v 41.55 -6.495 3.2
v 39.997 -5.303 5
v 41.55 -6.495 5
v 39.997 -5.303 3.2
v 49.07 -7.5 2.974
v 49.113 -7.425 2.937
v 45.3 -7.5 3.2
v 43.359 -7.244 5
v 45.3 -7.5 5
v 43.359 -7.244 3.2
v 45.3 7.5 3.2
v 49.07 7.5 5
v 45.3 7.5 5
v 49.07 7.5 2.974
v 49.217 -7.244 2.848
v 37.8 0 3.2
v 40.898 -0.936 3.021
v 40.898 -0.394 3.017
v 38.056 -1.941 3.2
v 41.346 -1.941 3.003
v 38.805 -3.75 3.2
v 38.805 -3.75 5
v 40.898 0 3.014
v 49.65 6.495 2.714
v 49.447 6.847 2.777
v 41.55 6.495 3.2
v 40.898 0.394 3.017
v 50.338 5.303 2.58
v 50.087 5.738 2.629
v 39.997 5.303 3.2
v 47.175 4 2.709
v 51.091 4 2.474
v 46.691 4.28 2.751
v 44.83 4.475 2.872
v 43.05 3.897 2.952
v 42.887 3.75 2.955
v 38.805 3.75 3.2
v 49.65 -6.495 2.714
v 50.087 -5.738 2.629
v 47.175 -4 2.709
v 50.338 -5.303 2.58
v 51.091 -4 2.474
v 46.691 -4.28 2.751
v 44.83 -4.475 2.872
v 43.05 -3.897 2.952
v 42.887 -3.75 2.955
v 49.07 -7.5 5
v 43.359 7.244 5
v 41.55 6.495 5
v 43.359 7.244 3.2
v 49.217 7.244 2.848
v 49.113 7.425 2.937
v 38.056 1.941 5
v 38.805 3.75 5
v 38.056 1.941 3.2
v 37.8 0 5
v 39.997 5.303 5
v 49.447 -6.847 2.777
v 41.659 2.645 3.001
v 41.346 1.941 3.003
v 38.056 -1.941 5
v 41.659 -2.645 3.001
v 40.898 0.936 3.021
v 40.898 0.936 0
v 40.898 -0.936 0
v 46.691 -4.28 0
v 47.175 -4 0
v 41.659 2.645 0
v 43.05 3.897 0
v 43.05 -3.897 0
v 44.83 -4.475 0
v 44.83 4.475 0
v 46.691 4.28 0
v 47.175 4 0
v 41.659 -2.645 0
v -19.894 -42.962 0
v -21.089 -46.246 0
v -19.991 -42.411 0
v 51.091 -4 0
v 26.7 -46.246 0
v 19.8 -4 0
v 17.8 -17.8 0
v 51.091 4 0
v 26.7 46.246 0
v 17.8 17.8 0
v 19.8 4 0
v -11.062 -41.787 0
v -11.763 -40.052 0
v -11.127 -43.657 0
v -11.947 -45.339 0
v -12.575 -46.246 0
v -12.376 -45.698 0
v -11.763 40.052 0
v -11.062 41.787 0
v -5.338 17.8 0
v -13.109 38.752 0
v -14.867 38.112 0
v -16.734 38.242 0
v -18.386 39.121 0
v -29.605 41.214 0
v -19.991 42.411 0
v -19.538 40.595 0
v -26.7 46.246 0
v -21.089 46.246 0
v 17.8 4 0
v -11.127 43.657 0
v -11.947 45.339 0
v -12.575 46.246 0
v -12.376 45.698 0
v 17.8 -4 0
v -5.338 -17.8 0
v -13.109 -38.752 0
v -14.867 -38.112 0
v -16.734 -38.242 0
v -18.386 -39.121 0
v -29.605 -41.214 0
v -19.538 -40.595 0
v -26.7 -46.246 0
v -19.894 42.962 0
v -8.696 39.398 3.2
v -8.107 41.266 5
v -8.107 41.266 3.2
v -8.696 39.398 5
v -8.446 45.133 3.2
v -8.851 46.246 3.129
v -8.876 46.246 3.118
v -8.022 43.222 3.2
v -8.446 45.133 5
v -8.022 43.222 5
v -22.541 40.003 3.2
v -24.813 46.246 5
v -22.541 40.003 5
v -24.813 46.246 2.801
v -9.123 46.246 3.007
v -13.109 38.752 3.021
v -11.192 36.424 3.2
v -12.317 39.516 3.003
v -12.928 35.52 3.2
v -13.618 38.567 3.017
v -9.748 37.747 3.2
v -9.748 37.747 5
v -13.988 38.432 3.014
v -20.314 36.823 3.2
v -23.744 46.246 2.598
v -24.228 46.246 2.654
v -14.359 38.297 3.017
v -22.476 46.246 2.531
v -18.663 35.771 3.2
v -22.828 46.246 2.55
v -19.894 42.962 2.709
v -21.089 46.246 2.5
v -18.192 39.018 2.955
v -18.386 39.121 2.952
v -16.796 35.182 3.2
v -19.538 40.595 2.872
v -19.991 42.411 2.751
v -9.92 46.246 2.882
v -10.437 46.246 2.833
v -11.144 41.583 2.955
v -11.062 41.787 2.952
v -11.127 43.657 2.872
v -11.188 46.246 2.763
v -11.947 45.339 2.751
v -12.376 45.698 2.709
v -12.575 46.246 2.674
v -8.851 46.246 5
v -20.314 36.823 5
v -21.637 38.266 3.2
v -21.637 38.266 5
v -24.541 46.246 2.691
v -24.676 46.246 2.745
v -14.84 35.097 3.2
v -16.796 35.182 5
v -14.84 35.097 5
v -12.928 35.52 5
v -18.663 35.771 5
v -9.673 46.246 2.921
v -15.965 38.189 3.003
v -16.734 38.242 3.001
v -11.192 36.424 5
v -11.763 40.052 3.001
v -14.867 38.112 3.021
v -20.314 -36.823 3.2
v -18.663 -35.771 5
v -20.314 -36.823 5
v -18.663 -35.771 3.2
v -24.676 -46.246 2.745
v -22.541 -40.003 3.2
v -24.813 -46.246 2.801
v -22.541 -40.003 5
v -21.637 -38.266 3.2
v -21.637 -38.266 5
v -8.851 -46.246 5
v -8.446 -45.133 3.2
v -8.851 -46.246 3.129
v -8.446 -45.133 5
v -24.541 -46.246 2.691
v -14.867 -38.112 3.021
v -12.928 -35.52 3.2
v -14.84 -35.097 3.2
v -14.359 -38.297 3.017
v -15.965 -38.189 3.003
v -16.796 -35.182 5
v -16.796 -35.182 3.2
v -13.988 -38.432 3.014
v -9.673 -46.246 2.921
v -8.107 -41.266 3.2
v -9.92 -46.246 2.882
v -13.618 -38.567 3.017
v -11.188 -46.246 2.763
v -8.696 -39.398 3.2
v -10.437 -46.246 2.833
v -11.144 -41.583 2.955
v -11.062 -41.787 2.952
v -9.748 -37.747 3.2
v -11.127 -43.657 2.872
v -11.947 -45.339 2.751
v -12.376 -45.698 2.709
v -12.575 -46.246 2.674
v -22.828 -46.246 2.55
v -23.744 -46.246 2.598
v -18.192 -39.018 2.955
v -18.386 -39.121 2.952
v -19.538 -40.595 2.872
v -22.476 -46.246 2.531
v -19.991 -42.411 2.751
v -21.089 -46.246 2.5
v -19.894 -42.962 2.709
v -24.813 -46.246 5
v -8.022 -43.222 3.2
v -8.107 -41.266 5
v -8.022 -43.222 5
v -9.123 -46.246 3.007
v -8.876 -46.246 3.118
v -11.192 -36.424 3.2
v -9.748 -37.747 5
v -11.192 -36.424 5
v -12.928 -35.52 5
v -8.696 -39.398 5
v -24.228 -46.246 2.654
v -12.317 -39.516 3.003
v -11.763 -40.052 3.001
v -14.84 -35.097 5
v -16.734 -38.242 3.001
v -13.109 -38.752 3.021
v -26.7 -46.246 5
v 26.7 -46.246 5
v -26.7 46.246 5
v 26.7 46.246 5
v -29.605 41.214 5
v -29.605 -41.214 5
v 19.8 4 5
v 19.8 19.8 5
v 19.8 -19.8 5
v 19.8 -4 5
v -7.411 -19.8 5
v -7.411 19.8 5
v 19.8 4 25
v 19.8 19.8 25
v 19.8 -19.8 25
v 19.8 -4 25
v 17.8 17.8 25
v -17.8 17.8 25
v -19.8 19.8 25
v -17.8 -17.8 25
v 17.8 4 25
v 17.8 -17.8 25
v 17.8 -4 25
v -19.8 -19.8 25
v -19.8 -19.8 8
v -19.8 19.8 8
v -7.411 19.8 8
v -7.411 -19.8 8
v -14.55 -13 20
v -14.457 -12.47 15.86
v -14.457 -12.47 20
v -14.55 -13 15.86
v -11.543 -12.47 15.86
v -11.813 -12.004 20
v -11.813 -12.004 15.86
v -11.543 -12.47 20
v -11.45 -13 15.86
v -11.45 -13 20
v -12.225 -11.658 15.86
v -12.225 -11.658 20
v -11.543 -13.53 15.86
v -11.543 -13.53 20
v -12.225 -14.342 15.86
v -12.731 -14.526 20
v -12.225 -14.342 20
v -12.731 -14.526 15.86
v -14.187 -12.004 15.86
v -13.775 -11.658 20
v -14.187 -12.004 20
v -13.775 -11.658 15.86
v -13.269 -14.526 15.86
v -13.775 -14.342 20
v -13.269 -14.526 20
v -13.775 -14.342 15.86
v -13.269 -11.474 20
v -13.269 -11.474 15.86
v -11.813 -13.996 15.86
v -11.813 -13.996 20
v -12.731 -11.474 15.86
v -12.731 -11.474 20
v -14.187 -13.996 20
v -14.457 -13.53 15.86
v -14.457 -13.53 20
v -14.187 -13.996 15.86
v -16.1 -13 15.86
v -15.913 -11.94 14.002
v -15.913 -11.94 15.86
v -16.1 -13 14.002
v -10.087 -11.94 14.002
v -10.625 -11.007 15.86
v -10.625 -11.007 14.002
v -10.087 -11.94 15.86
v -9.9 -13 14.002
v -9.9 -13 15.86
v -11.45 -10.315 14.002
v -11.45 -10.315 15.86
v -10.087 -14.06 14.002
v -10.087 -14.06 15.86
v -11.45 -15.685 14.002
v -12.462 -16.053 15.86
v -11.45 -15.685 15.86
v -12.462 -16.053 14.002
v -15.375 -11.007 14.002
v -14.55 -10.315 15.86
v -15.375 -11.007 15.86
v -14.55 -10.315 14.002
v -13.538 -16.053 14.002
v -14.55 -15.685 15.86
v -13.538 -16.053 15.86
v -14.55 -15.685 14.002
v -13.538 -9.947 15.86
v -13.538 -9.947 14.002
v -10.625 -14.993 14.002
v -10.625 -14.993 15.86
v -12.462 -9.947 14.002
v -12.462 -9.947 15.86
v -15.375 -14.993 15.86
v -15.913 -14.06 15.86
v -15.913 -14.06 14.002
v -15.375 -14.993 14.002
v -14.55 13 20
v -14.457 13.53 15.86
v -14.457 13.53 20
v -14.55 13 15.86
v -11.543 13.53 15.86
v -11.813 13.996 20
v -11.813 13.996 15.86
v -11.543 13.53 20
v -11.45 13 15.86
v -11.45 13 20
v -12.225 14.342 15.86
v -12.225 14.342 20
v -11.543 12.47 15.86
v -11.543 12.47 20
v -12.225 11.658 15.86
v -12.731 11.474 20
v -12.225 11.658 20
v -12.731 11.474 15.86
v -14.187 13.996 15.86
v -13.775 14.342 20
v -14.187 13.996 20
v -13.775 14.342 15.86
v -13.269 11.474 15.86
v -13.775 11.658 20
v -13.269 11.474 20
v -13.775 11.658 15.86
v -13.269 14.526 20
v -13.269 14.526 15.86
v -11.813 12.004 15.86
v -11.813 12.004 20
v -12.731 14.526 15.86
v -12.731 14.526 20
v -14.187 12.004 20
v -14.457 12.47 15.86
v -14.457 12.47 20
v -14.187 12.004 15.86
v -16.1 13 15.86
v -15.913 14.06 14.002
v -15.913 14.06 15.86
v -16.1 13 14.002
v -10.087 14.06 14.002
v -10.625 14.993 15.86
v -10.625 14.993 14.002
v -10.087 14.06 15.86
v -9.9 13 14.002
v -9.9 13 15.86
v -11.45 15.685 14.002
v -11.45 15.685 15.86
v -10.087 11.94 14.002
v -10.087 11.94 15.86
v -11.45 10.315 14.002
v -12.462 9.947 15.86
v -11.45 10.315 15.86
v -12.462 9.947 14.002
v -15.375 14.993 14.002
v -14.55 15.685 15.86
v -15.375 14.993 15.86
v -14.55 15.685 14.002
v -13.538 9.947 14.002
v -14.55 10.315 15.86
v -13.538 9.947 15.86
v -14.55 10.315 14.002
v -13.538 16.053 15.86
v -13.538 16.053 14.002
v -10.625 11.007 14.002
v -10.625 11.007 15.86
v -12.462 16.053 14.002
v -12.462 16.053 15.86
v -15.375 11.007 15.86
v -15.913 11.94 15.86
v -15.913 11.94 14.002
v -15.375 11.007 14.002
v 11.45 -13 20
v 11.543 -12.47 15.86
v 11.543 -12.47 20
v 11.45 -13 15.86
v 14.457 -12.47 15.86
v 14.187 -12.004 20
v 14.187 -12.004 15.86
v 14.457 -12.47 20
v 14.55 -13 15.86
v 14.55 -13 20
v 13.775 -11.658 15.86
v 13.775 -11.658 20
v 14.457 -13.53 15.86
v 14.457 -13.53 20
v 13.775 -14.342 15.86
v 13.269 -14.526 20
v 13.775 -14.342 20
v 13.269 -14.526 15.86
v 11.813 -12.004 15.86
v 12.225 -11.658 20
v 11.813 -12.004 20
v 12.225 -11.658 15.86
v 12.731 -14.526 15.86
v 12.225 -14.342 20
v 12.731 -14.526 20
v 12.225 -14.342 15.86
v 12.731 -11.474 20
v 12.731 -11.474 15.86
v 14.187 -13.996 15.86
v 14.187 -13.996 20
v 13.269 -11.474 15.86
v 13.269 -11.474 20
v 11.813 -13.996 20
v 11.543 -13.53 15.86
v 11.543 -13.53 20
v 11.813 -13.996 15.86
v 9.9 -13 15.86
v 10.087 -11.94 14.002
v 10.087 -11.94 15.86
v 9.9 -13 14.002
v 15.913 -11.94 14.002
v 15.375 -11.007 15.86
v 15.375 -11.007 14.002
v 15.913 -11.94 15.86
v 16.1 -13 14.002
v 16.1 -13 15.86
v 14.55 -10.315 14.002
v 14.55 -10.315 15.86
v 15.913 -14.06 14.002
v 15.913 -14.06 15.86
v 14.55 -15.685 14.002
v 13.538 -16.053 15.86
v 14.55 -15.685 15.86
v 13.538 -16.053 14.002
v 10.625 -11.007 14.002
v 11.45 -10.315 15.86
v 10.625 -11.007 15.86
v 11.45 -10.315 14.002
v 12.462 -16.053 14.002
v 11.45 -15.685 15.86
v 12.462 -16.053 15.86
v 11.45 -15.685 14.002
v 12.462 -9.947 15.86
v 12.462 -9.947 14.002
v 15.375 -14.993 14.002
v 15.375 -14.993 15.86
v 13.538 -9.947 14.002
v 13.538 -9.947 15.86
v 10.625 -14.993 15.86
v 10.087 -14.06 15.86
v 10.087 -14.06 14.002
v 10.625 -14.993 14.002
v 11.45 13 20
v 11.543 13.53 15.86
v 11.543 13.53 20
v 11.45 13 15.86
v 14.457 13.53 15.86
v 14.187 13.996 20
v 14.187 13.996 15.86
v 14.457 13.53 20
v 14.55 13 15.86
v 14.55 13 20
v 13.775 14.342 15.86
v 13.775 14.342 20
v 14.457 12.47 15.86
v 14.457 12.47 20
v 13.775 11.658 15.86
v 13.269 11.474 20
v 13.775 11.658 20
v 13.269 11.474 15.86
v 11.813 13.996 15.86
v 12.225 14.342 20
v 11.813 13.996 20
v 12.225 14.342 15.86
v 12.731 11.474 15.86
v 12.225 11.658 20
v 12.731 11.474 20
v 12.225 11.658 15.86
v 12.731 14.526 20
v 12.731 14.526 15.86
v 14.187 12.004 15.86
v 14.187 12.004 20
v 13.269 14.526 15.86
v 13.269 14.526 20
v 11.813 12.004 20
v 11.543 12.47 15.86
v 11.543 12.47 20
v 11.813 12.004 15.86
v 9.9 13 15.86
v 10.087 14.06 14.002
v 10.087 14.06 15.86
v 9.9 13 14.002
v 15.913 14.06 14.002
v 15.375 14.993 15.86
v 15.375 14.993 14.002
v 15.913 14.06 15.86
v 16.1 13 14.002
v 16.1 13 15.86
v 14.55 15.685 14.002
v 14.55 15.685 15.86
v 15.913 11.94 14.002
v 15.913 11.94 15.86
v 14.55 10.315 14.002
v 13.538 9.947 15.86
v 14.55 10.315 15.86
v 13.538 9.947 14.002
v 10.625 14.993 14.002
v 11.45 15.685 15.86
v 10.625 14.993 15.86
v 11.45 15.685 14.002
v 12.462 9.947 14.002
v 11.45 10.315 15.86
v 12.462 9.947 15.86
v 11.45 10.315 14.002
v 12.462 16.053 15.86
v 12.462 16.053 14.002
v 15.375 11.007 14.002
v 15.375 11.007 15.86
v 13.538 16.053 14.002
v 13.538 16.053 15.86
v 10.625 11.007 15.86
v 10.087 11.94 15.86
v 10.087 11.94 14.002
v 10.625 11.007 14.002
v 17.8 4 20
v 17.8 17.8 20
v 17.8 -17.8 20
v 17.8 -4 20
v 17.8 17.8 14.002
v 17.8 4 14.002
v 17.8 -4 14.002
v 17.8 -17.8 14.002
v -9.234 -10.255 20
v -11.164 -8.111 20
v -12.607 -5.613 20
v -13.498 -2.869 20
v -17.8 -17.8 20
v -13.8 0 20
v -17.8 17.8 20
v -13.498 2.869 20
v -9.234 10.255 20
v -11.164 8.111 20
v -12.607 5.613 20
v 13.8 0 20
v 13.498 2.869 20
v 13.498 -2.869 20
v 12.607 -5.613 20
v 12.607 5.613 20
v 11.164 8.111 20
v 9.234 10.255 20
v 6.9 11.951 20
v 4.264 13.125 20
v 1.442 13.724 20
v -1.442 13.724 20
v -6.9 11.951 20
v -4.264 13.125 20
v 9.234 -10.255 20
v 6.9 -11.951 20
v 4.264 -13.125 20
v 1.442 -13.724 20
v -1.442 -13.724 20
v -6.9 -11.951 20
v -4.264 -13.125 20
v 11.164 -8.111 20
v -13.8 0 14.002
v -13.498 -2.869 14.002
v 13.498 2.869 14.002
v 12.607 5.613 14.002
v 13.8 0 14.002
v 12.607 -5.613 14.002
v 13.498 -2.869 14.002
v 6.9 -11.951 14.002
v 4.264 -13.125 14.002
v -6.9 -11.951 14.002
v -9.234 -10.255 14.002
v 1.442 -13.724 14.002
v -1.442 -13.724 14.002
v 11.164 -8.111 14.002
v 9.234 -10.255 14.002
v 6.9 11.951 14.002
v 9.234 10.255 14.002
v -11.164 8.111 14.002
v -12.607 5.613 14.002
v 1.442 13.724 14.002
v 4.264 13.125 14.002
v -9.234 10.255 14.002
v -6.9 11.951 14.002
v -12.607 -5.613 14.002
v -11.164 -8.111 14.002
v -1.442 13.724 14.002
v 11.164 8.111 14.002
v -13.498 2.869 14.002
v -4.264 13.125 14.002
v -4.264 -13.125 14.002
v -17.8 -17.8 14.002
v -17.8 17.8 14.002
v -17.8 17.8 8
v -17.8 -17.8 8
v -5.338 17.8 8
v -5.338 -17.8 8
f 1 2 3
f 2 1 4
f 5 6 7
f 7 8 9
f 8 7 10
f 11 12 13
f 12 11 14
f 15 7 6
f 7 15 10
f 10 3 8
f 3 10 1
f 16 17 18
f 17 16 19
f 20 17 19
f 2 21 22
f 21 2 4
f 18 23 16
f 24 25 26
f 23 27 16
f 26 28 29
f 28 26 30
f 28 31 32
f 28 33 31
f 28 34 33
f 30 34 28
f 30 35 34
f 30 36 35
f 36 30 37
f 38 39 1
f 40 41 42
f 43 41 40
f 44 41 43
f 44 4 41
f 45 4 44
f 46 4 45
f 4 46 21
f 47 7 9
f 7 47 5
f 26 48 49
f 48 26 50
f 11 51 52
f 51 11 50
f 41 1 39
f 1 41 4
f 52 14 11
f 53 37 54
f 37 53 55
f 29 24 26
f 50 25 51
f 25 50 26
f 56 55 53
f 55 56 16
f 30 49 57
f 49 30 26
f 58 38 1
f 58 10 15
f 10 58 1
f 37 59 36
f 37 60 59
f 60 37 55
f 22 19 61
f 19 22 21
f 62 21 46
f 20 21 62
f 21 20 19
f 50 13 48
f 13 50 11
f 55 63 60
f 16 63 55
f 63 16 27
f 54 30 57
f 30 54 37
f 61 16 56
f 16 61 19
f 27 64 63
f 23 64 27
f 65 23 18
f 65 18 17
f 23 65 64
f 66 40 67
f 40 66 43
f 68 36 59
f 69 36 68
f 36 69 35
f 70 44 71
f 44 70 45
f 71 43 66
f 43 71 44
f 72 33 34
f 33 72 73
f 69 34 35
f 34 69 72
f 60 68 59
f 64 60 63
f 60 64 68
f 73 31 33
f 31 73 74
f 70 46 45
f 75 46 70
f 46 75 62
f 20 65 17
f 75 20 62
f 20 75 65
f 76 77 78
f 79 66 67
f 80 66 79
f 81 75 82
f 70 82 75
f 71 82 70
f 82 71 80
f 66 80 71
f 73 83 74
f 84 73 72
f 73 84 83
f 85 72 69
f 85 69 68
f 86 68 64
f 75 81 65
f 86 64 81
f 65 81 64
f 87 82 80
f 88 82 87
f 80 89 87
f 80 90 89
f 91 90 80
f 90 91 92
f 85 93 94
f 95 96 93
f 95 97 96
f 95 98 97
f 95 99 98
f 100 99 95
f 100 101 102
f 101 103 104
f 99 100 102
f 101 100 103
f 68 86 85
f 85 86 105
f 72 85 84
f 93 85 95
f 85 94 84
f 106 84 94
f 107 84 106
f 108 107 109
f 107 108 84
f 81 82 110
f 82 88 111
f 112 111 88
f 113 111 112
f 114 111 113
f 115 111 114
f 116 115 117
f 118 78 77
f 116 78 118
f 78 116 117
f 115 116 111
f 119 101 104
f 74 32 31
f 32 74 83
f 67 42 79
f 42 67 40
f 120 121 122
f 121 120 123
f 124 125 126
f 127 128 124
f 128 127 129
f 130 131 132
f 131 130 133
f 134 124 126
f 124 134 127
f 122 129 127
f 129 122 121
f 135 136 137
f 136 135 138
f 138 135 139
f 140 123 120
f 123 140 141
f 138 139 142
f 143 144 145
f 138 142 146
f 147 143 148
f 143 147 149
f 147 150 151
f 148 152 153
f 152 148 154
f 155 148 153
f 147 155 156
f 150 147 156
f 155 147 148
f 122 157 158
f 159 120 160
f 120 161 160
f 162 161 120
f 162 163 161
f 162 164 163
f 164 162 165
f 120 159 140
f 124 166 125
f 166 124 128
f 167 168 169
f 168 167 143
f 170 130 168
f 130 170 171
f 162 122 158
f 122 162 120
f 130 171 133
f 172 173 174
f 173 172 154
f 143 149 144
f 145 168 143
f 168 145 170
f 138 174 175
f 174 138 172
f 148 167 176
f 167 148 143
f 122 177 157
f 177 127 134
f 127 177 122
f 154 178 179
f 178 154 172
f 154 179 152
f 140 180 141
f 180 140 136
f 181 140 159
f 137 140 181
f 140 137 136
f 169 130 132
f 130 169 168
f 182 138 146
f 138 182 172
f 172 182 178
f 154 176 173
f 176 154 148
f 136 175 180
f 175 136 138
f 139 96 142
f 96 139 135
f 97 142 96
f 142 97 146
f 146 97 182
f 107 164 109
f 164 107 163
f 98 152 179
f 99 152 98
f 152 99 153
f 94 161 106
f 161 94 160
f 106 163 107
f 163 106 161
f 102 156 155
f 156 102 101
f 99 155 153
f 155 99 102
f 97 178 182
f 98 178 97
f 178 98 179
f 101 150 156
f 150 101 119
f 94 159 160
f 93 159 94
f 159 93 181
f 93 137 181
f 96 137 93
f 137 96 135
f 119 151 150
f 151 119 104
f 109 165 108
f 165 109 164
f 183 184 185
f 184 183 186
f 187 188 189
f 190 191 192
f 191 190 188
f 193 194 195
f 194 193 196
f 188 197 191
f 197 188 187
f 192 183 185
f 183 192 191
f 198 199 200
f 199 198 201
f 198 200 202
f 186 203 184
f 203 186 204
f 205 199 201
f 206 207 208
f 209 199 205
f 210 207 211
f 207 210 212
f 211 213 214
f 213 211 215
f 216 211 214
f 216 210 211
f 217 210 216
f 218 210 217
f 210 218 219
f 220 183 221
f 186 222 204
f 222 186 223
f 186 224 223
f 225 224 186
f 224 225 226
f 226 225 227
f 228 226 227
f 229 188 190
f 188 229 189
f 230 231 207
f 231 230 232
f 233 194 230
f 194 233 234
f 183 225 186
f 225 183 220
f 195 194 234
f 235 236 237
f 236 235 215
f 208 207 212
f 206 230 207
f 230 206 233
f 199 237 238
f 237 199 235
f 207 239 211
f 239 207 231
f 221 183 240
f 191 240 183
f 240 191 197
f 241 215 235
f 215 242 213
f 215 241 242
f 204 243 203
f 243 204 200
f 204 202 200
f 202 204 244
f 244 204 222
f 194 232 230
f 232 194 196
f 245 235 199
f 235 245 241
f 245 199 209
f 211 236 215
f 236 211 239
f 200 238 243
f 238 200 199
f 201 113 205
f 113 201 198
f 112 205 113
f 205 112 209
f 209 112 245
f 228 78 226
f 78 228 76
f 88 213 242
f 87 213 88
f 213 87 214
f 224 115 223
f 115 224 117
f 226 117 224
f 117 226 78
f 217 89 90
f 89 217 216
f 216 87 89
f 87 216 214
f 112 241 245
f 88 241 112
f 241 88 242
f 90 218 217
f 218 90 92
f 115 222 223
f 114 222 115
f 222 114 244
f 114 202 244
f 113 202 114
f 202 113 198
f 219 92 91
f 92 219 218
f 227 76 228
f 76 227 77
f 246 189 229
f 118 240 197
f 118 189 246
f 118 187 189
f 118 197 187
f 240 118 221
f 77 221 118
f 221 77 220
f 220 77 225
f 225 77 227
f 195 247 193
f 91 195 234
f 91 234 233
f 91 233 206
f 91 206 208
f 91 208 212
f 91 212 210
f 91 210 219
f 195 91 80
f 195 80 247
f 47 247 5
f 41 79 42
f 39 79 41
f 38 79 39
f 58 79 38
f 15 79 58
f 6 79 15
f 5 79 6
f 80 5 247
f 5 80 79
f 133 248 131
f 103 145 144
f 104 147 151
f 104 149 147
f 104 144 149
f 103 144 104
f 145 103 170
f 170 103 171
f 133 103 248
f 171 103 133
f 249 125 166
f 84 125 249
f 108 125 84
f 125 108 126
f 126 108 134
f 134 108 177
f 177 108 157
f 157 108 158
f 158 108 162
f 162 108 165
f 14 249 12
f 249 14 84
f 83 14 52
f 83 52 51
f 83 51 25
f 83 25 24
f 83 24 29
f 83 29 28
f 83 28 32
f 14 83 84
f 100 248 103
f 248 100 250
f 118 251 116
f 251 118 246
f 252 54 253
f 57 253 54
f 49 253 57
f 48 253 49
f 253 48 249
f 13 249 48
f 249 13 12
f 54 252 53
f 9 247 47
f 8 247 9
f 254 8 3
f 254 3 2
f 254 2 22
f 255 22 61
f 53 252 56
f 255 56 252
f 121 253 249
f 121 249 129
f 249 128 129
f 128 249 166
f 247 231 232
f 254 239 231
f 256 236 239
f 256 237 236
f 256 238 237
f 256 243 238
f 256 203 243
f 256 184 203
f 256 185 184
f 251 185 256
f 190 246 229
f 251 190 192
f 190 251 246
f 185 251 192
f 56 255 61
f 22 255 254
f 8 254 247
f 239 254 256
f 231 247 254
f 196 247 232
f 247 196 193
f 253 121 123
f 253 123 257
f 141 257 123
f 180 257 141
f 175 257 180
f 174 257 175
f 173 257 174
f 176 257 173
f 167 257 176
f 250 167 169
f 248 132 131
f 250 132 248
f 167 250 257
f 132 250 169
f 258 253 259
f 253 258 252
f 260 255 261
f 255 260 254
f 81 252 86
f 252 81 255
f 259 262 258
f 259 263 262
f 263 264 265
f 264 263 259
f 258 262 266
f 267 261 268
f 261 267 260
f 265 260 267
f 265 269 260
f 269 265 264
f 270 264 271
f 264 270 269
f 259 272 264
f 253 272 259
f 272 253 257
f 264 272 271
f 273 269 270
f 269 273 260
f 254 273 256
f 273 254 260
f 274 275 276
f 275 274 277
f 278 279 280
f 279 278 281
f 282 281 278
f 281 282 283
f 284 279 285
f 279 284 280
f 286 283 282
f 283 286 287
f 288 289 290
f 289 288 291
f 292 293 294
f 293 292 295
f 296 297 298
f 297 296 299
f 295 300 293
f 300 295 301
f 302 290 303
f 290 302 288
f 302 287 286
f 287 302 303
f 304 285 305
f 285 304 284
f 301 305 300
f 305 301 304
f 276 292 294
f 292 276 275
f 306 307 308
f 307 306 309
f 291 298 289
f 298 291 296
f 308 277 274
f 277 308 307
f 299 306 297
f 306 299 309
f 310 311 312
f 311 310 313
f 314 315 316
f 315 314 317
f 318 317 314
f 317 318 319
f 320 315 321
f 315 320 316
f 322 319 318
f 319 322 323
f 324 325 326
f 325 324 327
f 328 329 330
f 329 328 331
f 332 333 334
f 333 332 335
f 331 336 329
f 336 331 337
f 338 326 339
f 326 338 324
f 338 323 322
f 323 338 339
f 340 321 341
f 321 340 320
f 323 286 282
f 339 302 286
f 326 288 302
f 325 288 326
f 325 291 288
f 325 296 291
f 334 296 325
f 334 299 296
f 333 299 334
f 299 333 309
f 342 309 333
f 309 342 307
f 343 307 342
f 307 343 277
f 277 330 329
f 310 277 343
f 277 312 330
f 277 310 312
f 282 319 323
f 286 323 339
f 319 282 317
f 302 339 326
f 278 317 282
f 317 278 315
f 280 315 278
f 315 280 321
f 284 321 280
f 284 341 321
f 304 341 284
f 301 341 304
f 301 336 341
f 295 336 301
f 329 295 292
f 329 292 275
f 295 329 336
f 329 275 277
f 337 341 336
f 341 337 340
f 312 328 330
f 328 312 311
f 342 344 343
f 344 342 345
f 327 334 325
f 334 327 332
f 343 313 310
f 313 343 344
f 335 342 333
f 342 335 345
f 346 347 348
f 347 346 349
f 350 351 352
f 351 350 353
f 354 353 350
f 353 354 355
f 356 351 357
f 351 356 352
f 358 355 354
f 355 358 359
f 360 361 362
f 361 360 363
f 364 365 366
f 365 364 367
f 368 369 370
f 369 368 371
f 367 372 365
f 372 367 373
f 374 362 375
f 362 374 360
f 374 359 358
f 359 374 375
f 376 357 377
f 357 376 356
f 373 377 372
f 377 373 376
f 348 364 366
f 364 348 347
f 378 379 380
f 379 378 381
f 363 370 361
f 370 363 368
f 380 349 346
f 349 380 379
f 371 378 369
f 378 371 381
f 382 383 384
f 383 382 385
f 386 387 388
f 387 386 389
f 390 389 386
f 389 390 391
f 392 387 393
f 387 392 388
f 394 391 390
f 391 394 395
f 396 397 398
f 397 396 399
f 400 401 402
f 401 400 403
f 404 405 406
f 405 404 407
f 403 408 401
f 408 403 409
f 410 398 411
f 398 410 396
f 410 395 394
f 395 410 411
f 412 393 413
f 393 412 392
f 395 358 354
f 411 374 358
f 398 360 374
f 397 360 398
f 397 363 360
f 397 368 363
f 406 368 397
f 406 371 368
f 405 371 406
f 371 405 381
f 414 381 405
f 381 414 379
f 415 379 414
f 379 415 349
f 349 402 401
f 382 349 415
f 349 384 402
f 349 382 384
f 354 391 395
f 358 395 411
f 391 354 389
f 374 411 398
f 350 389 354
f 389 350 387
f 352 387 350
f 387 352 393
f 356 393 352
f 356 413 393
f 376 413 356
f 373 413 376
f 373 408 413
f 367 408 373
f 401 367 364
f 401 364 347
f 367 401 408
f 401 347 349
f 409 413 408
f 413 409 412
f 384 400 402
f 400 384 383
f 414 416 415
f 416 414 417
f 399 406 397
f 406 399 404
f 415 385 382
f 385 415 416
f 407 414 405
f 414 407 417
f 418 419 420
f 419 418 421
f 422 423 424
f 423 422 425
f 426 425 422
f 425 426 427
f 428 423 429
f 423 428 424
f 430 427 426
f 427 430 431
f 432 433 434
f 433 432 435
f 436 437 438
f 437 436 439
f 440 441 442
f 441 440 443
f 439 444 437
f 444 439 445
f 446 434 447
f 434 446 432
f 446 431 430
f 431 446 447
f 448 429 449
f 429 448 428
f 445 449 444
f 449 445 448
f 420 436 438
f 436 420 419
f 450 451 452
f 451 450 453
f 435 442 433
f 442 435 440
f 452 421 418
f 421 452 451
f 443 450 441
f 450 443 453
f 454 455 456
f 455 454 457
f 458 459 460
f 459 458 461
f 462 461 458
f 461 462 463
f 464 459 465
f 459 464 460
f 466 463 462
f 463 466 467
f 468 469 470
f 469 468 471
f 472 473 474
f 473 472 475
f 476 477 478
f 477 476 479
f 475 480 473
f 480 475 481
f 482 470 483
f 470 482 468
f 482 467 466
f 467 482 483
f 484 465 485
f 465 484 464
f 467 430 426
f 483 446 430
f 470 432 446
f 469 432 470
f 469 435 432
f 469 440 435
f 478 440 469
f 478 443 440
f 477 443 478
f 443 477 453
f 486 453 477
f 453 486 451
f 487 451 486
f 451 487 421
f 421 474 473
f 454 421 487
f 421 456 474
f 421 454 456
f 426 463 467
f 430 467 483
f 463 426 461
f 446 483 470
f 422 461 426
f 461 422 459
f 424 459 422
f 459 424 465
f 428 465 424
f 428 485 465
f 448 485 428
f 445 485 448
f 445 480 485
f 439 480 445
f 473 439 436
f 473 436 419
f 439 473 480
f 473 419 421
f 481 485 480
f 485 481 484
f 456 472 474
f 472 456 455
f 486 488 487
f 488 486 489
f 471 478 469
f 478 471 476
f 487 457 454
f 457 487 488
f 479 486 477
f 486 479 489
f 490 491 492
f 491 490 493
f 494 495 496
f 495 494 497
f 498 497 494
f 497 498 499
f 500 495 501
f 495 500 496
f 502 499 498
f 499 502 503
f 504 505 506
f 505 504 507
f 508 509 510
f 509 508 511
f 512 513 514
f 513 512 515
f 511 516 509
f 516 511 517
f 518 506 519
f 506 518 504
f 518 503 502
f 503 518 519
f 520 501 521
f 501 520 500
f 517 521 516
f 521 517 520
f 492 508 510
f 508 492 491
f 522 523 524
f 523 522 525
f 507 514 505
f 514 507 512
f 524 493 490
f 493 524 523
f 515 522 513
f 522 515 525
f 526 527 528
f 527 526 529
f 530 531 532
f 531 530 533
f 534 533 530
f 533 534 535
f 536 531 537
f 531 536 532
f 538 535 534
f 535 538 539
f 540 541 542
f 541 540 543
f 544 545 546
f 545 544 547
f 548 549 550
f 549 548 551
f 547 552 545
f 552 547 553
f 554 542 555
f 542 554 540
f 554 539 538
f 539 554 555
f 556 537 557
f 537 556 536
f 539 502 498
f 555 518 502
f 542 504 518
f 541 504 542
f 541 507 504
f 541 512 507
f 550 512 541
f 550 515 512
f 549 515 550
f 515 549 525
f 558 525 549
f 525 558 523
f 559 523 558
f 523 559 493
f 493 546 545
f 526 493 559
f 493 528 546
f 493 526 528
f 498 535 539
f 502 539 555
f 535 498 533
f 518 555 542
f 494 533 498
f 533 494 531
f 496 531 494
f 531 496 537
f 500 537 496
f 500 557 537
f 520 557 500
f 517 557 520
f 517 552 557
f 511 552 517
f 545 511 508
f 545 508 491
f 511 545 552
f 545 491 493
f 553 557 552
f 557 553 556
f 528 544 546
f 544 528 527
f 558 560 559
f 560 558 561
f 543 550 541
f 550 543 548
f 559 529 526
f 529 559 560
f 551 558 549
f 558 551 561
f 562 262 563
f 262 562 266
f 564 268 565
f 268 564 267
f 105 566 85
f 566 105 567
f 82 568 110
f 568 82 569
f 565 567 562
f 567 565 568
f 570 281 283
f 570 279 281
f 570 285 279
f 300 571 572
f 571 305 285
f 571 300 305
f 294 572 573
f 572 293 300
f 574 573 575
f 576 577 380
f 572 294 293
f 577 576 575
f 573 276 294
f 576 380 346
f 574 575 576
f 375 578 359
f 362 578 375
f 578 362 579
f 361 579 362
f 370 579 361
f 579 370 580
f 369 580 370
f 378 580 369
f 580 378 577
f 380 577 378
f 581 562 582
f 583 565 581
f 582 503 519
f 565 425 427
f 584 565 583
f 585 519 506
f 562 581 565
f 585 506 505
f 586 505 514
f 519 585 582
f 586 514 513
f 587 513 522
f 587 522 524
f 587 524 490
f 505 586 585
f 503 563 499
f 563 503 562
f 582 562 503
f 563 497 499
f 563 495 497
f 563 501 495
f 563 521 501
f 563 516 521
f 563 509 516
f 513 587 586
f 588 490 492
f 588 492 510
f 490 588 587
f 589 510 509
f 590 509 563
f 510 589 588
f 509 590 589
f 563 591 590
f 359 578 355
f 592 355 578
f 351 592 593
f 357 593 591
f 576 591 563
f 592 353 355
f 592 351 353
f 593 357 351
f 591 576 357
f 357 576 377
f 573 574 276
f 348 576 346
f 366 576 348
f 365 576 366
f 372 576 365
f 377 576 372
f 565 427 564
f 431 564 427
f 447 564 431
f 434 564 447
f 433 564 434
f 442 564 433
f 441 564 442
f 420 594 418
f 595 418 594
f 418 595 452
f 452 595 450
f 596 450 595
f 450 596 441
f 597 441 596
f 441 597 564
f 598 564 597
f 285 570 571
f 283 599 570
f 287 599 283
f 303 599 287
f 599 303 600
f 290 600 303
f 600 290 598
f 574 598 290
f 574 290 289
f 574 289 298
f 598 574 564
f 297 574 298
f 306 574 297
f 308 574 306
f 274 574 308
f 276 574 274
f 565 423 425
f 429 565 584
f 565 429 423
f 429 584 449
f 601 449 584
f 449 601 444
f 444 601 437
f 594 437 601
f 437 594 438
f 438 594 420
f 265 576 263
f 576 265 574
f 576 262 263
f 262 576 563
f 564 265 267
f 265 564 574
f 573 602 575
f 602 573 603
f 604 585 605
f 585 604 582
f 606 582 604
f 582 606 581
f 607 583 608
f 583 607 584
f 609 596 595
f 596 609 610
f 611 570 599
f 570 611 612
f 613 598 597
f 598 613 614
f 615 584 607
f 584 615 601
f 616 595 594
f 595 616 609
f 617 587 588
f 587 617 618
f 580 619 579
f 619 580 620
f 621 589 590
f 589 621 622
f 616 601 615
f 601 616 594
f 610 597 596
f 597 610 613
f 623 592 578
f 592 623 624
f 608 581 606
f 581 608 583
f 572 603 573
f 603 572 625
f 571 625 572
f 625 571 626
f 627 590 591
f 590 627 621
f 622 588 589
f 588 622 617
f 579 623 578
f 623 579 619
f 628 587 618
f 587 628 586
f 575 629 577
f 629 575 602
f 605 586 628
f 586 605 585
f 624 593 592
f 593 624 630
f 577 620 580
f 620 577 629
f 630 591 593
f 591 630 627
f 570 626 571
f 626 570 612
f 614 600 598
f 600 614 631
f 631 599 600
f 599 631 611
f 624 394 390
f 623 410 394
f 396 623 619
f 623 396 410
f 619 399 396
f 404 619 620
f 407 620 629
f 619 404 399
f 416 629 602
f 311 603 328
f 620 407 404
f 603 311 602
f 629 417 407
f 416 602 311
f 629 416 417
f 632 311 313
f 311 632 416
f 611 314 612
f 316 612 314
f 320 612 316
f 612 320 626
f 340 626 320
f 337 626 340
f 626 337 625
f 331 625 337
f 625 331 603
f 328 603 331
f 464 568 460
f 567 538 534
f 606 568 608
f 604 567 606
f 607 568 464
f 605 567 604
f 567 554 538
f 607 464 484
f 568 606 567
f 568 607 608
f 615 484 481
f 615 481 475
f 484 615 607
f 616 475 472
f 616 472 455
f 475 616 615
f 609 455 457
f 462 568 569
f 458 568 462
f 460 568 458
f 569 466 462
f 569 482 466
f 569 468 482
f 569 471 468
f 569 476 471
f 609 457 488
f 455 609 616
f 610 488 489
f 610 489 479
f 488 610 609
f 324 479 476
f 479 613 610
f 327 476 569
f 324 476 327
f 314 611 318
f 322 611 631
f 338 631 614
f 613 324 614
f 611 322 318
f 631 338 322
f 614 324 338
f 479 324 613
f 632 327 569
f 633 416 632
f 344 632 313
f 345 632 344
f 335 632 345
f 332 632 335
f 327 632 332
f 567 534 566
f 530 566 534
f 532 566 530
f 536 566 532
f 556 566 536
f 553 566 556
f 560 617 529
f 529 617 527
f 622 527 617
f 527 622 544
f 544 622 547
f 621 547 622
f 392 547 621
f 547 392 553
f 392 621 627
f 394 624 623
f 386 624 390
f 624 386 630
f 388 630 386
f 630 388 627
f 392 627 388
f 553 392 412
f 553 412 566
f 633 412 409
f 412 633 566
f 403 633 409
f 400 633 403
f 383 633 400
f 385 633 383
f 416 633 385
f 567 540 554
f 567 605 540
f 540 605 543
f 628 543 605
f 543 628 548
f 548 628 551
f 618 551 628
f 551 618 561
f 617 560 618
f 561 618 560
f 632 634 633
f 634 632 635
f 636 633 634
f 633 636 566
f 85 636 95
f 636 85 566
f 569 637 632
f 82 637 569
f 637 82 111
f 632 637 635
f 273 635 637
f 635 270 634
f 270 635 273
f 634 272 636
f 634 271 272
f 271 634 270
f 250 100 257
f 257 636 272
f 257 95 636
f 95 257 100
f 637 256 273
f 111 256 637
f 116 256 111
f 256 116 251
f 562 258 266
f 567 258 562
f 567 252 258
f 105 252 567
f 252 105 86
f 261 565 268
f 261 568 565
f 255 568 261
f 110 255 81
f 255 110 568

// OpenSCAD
motor_d = 35.6;
motor_h = 26;
wall_t = 2;
wall_h = 25;
base_h = 5;
base_d = 3 * motor_d;

wires_d = 8;

sucker_neck_d = 9;
sucker_slot_d = 8;
sucker_neck_h = 3.2;
sucker_head_d = 15;

sucker_pos = base_d/2 - 0.9*sucker_neck_d;

sucker_cup_h = 9;
sucker_cup_d = 42;

axle_l = 22;
axle_d = 5;
axle_overhang = 2;
motor_base = axle_l - axle_overhang;
mount_pos = 26/2;
mount_screw_d = 3.1;
mount_screw_head_d = 2 * mount_screw_d;
mount_screw_head_h = 0.6 * mount_screw_d;
mount_h = 6;

sprocket_h = 10;
sprocket_d = 23;
belt_a = 95;

segments = 18;
e = 0.002;

module oval_hole(z_off, h,d,s) {
    translate([0,0,z_off + h/2]) {
        hull() {
            cylinder(d=d, center=true, h=h);
            translate([ d, 0, 0]) {
                cylinder(d=d, center=true, h=2*h);
            }
        }               
    }
}
        
module sucker_hole() {
    // translate to sucker vertical axis
    translate([sucker_pos,0,0]) {
        union() {
            // space for the sucker head
            oval_hole(sucker_neck_h, base_h - sucker_neck_h, sucker_head_d, sucker_head_d);
            // sucker neck hole & slot
            // hole
            cylinder(d=sucker_neck_d, h=sucker_neck_h, center=false);
            // slot
            translate([0,-sucker_slot_d/2,0]) {
                cube(size=[100,sucker_slot_d,sucker_neck_h]);
            }
        }
    }
}

module sucker_cup() {
        cylinder(d1 = sucker_cup_d, d2=sucker_neck_d, h=sucker_cup_h);
}

module suckers() {
    for(a = [0,110,250]) {
        rotate(a=a) translate([sucker_pos,0,-sucker_cup_h]) color("lightcyan") sucker_cup();
    }
}

module base() {
    difference() {
        cylinder(d = base_d, h = base_h, $fn = 6);

        rotate (a=0) sucker_hole();
        rotate (a=110) sucker_hole();
        rotate (a=250) sucker_hole();            
    }
}

module wire_hole() {
    translate([motor_d/2 + wall_t/2,0,wall_h/2]) {
        cube(size = [wall_t, wires_d,wall_h], center = true);
    }
}

module screw_hole(cx, cy) {
    union() {
        mount_d = motor_d - 2 * mount_pos;
        cylinder(d = mount_screw_d, 
                 h = mount_h + e, 
                 $fn = segments);
        cylinder(d = mount_screw_head_d,
                 h = mount_screw_head_h,
                 $fn = segments);
    }
}

module motor_hole() {
    union() {
        translate([-motor_d/2,-motor_d/2,motor_base])
            cube(size=[motor_d, motor_d, wall_h]);
        
        screw_base = motor_base - mount_h;
        translate( [0,0,screw_base]) {
            translate([-mount_pos,-mount_pos, 0]) screw_hole();
            translate([-mount_pos,mount_pos, 0]) screw_hole();
            translate([mount_pos,-mount_pos, 0]) screw_hole();
            translate([mount_pos,mount_pos, 0]) screw_hole();
        }

        cylinder(h = motor_base, d = sprocket_d*1.2);
        translate([-motor_d/2,-motor_d/2,0])
            cube(size=[motor_d, motor_d, screw_base + e]);

        
    }        
}

module walls() {
    wall_size = motor_d + 2*wall_t;

    translate([0,0,wall_h/2]) {
            cube(center = true,  size=[wall_size, wall_size, wall_h]);
        }
}


module motor() {
    color("blue") translate([-motor_d/2, -motor_d/2, motor_base]) {
            cube(size=[motor_d, motor_d, motor_h]); 
    }
    color("lightblue") translate([0,0,-axle_overhang]) {
        cylinder(d=axle_d, h=axle_l);
    }

}

module belt_hole() {
    color("red") translate([0,0,-axle_overhang]) union() {
        cylinder(d=sprocket_d, h = sprocket_h, $fn = segments);
        linear_extrude(height = sprocket_h) {
            polygon(points = [[0, 1.1*sprocket_d/2], 
                              [-100,100*tan(belt_a/2)], 
                              [-100,-100*tan(belt_a/2)],
                              [0,-1.1*sprocket_d/2]]);
        }
    }

}
module hw() {
    suckers();
    motor();
}


union() {
    union() {
        difference() {
            union() {
                walls();
                base();
            }
            motor_hole();
            wire_hole();
            belt_hole();                
        }
    }
    
//    hw();
}
    
